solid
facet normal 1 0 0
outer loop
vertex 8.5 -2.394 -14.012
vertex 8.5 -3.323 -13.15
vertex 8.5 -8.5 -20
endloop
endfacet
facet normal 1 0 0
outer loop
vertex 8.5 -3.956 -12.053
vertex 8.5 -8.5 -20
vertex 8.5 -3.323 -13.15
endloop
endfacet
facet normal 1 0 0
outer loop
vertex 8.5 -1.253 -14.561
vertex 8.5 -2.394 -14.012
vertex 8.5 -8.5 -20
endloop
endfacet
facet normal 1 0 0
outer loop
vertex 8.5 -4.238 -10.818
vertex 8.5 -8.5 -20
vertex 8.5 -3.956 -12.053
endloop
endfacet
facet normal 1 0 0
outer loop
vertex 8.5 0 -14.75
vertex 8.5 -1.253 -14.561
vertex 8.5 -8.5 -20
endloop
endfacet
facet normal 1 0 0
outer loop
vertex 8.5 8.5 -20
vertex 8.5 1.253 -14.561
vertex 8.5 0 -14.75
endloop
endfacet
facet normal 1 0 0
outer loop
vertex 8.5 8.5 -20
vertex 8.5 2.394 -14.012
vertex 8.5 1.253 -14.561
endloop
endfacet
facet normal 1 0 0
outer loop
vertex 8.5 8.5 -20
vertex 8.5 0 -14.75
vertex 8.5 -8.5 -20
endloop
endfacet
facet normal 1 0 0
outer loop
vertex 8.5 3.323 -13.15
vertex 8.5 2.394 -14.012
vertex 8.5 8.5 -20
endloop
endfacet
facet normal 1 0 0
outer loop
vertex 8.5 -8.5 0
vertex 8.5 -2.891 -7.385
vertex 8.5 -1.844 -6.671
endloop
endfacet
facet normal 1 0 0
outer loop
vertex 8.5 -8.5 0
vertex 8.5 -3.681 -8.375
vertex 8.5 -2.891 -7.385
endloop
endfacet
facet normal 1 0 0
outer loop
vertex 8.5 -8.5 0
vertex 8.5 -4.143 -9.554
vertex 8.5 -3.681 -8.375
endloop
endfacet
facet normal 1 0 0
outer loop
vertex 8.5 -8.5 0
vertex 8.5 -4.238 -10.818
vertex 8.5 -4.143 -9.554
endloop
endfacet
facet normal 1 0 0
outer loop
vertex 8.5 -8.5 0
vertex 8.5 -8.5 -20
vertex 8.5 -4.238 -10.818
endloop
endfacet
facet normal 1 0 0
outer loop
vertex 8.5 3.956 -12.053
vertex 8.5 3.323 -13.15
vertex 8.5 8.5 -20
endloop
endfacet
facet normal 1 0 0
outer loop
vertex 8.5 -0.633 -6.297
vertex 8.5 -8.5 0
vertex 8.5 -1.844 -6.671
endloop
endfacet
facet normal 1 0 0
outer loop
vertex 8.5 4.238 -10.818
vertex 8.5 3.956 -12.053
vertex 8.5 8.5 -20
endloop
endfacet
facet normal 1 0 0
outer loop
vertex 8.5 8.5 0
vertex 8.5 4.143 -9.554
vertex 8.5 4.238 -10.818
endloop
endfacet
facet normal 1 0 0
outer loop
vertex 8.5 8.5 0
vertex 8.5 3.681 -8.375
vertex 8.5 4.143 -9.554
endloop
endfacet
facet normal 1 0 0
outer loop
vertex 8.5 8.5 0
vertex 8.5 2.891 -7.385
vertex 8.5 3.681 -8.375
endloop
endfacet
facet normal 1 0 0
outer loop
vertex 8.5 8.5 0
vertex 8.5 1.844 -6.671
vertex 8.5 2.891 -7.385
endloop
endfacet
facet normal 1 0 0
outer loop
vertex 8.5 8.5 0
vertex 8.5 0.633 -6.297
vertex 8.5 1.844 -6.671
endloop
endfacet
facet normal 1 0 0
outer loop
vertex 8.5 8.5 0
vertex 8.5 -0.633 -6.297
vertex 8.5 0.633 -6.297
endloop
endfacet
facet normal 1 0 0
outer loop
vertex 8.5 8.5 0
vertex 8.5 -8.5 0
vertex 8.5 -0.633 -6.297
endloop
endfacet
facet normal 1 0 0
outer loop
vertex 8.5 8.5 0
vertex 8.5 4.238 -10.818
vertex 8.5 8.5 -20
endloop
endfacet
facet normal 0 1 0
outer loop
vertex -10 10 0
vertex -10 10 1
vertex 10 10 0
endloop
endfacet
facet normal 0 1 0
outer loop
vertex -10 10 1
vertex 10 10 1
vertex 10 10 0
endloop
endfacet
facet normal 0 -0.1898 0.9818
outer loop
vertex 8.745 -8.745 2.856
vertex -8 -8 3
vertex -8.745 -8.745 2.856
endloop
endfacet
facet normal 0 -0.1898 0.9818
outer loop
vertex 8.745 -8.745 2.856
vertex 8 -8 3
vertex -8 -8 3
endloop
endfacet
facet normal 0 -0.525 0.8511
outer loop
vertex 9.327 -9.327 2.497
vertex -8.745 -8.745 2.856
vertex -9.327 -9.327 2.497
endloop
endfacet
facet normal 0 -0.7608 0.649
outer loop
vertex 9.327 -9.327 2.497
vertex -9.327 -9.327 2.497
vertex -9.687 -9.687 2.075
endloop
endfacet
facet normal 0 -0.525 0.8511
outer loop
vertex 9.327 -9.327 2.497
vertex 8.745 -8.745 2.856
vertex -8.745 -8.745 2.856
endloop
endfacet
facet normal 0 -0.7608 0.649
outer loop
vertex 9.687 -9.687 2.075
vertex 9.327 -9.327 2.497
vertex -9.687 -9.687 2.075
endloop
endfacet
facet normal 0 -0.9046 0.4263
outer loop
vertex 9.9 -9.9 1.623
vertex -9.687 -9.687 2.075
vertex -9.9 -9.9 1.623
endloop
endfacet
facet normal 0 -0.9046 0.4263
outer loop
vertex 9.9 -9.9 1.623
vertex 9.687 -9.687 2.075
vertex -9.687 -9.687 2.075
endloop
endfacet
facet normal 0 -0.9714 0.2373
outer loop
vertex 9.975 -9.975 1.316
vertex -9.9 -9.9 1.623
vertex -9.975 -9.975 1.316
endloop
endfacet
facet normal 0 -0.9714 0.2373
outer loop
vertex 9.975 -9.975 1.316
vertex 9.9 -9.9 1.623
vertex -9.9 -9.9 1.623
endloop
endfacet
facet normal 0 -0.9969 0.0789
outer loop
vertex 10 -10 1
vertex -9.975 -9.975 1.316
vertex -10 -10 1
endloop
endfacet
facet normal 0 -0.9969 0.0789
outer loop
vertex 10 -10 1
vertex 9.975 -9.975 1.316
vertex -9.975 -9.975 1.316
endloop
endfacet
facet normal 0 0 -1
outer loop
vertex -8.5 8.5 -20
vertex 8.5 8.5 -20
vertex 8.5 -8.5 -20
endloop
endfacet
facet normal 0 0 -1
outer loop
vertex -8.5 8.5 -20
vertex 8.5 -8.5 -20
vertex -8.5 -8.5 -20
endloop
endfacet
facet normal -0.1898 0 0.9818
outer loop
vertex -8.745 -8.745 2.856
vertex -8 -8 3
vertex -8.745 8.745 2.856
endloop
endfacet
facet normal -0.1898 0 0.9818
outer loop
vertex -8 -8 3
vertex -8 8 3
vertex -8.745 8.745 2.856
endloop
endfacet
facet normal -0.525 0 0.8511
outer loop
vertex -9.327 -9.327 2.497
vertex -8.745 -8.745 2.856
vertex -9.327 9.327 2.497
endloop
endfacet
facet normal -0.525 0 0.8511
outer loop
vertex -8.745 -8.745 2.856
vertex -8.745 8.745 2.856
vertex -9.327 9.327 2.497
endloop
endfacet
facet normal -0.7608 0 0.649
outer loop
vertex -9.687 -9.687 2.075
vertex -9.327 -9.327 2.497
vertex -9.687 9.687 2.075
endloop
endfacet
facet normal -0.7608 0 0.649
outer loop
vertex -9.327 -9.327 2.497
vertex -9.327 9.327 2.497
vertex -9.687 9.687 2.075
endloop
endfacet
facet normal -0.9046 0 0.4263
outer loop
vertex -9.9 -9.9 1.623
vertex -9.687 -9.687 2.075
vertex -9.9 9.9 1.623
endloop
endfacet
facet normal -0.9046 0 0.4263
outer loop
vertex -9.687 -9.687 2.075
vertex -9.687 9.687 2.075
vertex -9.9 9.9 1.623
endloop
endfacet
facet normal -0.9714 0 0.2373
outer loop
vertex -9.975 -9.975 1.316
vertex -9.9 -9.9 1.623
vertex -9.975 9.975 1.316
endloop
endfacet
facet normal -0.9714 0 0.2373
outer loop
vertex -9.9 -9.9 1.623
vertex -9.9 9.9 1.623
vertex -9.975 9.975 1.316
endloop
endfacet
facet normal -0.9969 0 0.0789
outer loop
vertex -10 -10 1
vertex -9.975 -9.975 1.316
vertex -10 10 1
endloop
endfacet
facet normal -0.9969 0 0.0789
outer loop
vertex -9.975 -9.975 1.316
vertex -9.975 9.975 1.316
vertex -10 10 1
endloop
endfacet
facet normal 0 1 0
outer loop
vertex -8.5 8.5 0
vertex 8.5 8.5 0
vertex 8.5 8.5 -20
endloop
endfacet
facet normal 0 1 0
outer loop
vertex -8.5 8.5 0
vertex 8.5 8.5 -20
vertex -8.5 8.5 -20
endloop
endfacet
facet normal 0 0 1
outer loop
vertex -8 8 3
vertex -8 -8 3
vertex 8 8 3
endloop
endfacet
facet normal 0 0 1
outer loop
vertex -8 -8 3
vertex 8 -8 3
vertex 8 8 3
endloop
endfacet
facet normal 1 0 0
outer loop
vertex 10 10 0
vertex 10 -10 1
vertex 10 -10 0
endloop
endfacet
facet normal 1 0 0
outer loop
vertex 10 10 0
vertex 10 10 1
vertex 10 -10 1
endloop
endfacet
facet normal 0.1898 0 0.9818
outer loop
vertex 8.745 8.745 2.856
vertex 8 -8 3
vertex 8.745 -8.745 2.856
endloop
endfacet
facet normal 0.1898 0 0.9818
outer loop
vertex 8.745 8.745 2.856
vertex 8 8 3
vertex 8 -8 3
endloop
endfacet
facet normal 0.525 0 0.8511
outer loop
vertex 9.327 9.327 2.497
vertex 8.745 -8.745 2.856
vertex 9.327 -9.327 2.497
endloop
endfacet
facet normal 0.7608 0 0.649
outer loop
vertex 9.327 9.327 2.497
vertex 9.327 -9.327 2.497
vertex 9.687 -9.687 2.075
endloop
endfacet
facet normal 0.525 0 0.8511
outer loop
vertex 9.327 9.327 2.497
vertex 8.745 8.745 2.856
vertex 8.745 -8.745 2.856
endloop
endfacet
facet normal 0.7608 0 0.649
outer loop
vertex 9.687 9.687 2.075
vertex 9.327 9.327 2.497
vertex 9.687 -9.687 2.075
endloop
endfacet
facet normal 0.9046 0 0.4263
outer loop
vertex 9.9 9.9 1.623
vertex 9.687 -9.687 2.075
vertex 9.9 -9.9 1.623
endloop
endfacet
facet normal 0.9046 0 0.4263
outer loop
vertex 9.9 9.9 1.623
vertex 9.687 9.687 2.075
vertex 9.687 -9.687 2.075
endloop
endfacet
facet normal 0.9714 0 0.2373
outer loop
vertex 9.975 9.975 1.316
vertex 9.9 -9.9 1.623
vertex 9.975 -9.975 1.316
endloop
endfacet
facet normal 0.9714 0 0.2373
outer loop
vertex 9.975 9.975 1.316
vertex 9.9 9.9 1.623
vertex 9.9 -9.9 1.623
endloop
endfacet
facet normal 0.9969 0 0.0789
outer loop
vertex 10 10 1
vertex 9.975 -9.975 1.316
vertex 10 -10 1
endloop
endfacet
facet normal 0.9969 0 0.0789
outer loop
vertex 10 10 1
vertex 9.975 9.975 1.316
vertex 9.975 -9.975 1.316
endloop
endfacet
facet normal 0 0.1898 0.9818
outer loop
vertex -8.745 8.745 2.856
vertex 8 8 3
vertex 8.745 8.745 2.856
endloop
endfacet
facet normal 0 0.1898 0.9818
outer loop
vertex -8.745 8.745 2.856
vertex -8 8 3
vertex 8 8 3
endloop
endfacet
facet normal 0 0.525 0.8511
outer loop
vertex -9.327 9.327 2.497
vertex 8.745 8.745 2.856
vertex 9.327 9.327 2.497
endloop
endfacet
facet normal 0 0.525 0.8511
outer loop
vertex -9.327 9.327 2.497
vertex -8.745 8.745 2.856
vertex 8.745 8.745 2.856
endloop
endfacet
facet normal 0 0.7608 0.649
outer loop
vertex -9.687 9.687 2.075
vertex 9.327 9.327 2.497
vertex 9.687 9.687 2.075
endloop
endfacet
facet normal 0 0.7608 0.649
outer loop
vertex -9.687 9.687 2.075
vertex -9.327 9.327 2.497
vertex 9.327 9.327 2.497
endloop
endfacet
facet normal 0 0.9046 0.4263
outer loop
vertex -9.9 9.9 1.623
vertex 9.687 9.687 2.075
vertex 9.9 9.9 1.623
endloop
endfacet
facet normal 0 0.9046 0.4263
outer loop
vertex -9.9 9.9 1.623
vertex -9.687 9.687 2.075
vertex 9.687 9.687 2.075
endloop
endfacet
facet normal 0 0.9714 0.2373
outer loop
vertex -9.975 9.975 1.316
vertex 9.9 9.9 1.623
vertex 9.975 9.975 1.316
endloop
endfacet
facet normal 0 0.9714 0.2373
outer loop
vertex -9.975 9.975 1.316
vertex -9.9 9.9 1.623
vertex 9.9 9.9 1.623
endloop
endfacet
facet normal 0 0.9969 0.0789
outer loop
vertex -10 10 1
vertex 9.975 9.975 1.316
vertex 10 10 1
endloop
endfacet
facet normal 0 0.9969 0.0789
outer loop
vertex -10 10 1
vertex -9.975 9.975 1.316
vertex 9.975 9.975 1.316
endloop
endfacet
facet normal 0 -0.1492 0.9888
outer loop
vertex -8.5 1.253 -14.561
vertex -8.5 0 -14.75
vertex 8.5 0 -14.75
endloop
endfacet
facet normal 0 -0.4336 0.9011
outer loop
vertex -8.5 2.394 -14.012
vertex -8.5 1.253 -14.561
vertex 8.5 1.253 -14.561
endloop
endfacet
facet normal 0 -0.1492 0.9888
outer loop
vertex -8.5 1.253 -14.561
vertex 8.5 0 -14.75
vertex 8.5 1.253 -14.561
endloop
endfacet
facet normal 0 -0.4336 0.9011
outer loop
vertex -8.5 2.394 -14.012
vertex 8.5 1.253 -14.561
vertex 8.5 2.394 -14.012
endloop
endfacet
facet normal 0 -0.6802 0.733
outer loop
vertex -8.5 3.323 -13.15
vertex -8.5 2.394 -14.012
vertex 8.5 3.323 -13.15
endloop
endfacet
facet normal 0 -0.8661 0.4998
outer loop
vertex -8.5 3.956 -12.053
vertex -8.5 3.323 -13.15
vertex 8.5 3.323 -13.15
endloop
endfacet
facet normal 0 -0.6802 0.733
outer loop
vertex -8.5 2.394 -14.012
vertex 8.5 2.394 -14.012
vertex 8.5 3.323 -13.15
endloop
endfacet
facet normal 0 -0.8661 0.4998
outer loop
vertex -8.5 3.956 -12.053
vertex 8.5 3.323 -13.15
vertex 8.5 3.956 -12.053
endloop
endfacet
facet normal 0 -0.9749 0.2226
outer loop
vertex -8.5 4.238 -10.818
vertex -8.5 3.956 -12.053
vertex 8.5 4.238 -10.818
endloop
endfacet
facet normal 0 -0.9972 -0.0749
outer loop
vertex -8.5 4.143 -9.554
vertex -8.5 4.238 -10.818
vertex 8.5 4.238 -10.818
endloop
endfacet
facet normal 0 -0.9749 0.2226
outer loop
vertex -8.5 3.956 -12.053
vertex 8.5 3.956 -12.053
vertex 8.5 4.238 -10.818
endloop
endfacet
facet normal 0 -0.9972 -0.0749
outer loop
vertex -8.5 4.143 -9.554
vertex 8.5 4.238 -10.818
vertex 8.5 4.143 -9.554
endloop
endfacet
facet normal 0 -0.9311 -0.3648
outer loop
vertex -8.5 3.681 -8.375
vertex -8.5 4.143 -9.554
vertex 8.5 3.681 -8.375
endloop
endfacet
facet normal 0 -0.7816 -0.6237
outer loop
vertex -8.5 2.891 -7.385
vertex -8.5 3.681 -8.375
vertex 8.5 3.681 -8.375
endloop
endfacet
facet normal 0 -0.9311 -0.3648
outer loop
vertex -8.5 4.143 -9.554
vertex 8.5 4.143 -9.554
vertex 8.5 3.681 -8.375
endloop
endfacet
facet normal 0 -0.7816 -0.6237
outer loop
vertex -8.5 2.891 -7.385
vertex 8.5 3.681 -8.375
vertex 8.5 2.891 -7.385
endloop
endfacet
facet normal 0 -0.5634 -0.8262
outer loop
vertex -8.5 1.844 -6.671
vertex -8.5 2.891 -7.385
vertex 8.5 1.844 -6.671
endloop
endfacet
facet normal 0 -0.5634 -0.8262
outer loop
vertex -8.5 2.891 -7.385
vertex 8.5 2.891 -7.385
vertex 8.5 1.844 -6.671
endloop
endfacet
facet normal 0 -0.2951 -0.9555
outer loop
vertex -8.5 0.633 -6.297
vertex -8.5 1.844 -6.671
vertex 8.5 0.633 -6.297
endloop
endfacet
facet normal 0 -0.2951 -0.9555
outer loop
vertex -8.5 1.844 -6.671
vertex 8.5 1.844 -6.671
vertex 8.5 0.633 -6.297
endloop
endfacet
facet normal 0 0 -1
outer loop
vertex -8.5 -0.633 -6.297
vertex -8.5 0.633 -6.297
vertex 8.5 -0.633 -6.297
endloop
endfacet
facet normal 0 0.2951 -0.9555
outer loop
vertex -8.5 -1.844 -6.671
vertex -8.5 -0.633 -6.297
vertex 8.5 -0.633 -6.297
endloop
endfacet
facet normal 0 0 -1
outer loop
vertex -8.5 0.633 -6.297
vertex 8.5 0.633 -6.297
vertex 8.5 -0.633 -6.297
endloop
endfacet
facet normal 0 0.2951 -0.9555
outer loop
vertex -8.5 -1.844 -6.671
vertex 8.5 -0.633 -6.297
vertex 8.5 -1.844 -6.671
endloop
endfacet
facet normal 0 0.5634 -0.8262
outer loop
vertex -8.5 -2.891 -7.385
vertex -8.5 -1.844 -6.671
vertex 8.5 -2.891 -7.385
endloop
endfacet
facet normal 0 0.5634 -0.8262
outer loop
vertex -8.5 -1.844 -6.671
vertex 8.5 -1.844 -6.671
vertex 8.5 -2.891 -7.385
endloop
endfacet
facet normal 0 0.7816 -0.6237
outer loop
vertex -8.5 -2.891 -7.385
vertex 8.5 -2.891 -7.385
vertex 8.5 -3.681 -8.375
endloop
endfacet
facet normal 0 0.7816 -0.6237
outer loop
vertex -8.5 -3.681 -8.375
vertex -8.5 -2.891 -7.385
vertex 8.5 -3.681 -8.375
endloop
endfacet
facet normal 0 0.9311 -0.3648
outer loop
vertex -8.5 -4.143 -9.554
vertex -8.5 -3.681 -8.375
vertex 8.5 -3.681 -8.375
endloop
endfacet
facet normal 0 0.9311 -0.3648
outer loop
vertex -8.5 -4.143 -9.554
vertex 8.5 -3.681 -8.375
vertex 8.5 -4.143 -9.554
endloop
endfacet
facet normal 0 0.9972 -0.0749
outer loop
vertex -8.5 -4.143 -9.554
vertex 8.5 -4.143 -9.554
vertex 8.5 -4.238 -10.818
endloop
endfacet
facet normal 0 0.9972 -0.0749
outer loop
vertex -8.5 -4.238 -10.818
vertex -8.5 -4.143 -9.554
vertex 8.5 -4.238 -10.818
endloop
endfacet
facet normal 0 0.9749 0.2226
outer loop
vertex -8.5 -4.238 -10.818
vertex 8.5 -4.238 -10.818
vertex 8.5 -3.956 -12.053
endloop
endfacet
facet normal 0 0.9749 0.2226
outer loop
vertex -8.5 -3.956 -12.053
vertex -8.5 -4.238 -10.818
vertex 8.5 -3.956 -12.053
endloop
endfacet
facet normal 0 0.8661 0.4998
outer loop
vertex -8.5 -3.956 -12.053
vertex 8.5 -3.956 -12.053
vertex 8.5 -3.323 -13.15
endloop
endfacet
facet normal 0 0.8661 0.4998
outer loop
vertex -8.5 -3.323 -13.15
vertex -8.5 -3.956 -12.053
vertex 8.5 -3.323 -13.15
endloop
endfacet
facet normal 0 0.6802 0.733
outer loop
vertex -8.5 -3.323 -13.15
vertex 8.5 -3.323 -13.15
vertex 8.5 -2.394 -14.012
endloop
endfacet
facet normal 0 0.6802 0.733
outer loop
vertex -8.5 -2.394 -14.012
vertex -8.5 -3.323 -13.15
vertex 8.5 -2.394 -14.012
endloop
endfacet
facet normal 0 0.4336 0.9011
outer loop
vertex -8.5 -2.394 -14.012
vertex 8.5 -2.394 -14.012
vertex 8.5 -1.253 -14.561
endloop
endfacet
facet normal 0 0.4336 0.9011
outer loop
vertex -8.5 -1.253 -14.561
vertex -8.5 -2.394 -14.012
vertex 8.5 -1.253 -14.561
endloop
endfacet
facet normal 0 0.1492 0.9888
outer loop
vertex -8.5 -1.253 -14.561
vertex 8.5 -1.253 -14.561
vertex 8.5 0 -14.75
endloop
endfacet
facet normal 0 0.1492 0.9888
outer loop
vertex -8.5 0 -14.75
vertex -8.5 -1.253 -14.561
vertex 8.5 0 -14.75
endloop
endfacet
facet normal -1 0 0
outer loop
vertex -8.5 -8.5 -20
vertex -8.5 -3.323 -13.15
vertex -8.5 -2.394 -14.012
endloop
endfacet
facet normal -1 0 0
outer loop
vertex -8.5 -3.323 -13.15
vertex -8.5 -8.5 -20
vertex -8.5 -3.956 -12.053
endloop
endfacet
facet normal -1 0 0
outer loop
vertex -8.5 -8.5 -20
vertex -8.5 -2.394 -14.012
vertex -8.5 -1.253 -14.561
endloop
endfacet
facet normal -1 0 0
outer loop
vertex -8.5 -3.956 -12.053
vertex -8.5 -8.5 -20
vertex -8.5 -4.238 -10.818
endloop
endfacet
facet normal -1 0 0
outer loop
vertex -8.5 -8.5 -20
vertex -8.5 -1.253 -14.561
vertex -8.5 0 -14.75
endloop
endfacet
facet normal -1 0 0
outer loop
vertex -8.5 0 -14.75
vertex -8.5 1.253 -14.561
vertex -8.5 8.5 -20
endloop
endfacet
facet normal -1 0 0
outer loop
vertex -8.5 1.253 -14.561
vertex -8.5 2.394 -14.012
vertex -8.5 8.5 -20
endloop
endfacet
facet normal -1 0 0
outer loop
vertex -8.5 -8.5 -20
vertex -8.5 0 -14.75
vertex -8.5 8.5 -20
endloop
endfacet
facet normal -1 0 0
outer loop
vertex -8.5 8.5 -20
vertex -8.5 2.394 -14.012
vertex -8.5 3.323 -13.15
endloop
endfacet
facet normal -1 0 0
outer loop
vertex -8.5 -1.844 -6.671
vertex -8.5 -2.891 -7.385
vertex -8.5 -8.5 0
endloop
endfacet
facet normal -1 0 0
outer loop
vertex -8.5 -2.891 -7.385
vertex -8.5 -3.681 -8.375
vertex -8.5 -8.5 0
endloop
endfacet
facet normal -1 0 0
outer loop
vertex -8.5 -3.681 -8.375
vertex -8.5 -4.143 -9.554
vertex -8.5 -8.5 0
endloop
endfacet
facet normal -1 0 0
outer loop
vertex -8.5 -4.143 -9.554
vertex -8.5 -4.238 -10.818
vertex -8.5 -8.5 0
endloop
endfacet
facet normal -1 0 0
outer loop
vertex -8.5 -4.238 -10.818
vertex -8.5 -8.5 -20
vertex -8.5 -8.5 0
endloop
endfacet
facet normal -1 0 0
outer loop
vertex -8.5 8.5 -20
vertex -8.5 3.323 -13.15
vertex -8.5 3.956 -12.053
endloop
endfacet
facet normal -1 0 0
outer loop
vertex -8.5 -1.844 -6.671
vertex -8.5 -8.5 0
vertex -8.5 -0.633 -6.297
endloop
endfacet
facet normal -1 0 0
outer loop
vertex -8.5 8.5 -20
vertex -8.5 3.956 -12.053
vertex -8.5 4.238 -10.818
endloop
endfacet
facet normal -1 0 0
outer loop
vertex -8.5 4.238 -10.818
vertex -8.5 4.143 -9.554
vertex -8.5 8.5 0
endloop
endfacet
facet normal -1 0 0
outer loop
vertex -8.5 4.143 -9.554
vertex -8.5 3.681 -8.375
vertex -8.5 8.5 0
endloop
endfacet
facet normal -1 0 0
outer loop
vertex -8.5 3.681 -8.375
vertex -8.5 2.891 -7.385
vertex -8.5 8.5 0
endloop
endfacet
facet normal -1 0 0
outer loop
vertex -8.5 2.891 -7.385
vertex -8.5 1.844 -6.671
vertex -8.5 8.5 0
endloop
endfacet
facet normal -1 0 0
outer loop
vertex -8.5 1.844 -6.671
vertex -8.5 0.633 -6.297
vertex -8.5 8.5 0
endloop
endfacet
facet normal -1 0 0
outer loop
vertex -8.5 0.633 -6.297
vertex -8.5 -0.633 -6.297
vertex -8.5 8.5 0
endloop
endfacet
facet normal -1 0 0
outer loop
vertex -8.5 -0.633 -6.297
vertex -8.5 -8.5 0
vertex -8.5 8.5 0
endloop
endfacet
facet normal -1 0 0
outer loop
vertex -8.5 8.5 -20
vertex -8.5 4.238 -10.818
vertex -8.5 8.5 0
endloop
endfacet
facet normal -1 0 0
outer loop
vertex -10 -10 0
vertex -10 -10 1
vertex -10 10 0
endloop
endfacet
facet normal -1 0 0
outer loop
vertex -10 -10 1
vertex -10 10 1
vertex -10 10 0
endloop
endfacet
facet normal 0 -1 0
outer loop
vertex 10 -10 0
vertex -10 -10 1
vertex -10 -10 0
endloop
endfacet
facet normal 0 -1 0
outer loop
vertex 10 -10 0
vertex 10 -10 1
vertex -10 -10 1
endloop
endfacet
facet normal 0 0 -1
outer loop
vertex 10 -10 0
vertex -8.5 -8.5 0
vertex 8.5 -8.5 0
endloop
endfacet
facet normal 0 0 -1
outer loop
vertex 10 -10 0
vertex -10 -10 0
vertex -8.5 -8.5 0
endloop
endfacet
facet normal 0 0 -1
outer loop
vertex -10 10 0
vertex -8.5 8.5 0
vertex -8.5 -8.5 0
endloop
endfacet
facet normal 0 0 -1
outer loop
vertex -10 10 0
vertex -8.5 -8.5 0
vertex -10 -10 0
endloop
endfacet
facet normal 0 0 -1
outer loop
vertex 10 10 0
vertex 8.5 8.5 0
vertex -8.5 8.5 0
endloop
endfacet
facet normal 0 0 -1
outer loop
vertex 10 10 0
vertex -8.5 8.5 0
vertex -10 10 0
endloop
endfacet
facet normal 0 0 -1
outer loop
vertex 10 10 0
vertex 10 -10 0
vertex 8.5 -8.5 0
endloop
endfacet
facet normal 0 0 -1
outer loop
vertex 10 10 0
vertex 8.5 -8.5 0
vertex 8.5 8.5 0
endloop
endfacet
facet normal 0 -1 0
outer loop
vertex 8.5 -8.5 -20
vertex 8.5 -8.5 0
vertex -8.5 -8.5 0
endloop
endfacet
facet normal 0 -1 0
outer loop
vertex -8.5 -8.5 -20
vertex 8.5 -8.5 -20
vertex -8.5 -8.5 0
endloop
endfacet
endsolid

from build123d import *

# Parameters (mm, degrees)
SKETCH1_W           = 3
SKETCH1_H           = 20
BOSS_EXTRUDE1_DEPTH = 10
SKETCH2_W           = 17
SKETCH2_H           = 17
BOSS_EXTRUDE2_DEPTH = 20
SKETCH3_R           = 4.25
CUT_EXTRUDE1_DEPTH  = 30.021543722
FILLET1_R           = 2


with BuildPart() as part:
    # Sketch1 → Boss-Extrude1 (new, symmetric)
    with BuildSketch(Plane(origin=(0, 0, 0), x_dir=(0, 0, -1), z_dir=(1, 0, 0))):
        with Locations((-1.5, 0)):
            Rectangle(SKETCH1_W, SKETCH1_H)
    extrude(amount=BOSS_EXTRUDE1_DEPTH, both=True)

    # Sketch2 → Boss-Extrude2 (add)
    with BuildSketch(Plane(origin=(0, 0, 0), x_dir=(-1, 0, 0), z_dir=(0, 0, -1))):
        Rectangle(SKETCH2_W, SKETCH2_H)
    extrude(amount=BOSS_EXTRUDE2_DEPTH)

    # Sketch3 → Cut-Extrude1 (cut, through all)
    with BuildSketch(Plane(origin=(8.5, 0, 0), x_dir=(0, 0, -1), z_dir=(1, 0, 0))):
        with Locations((10.5, 0)):
            Circle(SKETCH3_R)
    extrude(amount=-CUT_EXTRUDE1_DEPTH, mode=Mode.SUBTRACT)

    # Fillet1
    fillet1_edges = [part.edges().sort_by_distance(p)[0] for p in [
        (-10, 0, 3),
        (0, -10, 3),
        (0, 10, 3),
        (10, 0, 3),
    ]]
    fillet(fillet1_edges, radius=FILLET1_R)


solid = part.part
